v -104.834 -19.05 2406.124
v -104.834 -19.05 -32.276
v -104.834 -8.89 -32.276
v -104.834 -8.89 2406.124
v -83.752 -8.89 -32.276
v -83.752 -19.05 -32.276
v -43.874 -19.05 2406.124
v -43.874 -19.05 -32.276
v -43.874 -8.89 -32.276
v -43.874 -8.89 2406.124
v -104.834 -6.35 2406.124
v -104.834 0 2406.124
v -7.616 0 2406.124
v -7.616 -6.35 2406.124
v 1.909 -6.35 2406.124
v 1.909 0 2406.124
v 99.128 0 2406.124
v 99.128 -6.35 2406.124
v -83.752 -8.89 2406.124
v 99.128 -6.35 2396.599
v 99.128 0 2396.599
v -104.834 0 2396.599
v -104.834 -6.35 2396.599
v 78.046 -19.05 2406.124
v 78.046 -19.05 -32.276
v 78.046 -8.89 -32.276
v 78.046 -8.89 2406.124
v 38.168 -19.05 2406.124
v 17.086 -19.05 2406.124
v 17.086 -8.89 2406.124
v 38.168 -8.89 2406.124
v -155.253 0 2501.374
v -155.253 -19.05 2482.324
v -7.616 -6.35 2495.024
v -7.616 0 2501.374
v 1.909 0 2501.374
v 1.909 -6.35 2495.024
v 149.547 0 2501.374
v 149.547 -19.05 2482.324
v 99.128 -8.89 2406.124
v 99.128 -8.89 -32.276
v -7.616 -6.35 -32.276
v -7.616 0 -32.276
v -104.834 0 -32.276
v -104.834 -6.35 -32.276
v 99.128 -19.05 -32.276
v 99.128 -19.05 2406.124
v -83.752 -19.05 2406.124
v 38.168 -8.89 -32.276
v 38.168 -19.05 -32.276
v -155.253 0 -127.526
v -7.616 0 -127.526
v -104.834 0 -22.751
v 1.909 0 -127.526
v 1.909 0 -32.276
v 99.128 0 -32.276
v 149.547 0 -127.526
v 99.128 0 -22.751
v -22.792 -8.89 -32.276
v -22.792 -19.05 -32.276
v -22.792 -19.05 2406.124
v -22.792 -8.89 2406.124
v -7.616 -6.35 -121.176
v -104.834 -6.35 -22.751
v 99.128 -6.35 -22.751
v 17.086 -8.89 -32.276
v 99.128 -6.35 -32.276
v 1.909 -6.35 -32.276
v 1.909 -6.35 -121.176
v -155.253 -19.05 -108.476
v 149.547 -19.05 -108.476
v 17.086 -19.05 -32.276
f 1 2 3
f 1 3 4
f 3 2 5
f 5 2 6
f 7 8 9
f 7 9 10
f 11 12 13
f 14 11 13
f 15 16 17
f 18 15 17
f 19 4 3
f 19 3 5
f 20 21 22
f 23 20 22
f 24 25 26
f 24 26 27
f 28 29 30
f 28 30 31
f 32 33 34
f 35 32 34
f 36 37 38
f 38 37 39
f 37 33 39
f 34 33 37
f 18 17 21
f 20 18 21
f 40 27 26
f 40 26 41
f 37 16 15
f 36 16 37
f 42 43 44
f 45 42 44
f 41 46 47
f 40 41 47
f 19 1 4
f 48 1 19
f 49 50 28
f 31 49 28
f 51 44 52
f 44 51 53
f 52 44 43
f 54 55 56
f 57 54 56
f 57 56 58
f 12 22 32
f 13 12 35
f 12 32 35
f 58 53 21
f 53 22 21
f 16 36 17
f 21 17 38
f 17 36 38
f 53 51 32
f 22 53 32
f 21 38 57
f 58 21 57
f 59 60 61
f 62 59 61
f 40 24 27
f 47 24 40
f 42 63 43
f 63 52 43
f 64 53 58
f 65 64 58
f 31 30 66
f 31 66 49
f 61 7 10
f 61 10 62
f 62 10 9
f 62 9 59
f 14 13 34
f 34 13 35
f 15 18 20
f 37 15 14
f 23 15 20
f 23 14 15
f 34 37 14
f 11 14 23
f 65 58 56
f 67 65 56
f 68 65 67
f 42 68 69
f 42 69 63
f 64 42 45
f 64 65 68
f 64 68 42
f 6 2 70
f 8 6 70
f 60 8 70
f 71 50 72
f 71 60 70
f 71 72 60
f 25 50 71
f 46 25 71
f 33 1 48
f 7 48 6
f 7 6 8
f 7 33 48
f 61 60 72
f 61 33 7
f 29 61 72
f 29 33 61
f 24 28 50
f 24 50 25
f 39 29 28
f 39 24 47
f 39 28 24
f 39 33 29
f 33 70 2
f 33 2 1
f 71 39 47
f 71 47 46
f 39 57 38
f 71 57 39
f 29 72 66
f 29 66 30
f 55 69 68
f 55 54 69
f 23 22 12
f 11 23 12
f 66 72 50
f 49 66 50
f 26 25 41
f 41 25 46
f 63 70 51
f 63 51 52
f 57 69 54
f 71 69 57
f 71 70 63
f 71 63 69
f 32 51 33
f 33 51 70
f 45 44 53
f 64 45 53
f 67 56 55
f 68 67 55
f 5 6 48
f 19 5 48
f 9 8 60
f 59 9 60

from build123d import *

# Parameters (mm, degrees)
F0_W     = 304.8
F0_H     = 2628.9
F1_DEPTH = 19.05
F2_SIZE  = 19.04999
F3_W     = 21.082
F3_H     = 2438.4
F4_DEPTH = 10.16
F5_W     = 9.525
F5_H     = 95.25
F6_DEPTH = 6.35


# Not quite as in the source:
# - a fillet or chamfer is up to 0.001 mm smaller than in the source, because OpenCascade refuses the exact size


with BuildPart() as f1:
    # F0 (on Front) → F1 (new body)
    with BuildSketch(Plane.XZ):
        with Locations((-2.8532538563, 1186.9243339048)):
            Rectangle(F0_W, F0_H)
    extrude(amount=F1_DEPTH)

    # F2 (size 19.05 in the source; OpenCascade refuses exactly that, so slightly less here)
    f2_edges = [f1.edges().sort_by_distance(p)[0] for p in [
        (-2.853254, -19.05, 2501.374334),
        (-2.853254, -19.05, -127.525666),
    ]]
    chamfer(f2_edges, length=F2_SIZE)

    # F3 (on face) → F4 (cut)
    with BuildSketch(Plane.XZ.offset(19.05)):
        with Locations((-94.2932538563, 1186.9243339048)):
            Rectangle(F3_W, F3_H)
        with Locations((-33.3332538563, 1186.9243339048)):
            Rectangle(F3_W, F3_H)
        with Locations((27.6267461437, 1186.9243339048)):
            Rectangle(F3_W, F3_H)
        with Locations((88.5867461437, 1186.9243339048)):
            Rectangle(F3_W, F3_H)
    extrude(amount=-F4_DEPTH, mode=Mode.SUBTRACT)

    # F5 (on face) → F6 (cut)
    with BuildSketch(Plane(origin=(0, 0, 0), x_dir=(-1, 0, 0), z_dir=(0, 1, 0))):
        Polygon((-1.9092461437, 2406.1243339048), (-99.1277461437, 2406.1243339048), (-99.1277461437, 2396.5993339048), (104.8342538563, 2396.5993339048), (104.8342538563, 2406.1243339048), (7.6157538563, 2406.1243339048), align=None)
        with Locations((2.8532538563, 2453.7493339048)):
            Rectangle(F5_W, F5_H)
        with Locations((2.8532538563, -79.9006660952)):
            Rectangle(F5_W, F5_H)
        Polygon((-99.1277461437, -32.2756660952), (-1.9092461437, -32.2756660952), (7.6157538563, -32.2756660952), (104.8342538563, -32.2756660952), (104.8342538563, -22.7506660952), (-99.1277461437, -22.7506660952), align=None)
    extrude(amount=-F6_DEPTH, mode=Mode.SUBTRACT)


solid = f1.part
